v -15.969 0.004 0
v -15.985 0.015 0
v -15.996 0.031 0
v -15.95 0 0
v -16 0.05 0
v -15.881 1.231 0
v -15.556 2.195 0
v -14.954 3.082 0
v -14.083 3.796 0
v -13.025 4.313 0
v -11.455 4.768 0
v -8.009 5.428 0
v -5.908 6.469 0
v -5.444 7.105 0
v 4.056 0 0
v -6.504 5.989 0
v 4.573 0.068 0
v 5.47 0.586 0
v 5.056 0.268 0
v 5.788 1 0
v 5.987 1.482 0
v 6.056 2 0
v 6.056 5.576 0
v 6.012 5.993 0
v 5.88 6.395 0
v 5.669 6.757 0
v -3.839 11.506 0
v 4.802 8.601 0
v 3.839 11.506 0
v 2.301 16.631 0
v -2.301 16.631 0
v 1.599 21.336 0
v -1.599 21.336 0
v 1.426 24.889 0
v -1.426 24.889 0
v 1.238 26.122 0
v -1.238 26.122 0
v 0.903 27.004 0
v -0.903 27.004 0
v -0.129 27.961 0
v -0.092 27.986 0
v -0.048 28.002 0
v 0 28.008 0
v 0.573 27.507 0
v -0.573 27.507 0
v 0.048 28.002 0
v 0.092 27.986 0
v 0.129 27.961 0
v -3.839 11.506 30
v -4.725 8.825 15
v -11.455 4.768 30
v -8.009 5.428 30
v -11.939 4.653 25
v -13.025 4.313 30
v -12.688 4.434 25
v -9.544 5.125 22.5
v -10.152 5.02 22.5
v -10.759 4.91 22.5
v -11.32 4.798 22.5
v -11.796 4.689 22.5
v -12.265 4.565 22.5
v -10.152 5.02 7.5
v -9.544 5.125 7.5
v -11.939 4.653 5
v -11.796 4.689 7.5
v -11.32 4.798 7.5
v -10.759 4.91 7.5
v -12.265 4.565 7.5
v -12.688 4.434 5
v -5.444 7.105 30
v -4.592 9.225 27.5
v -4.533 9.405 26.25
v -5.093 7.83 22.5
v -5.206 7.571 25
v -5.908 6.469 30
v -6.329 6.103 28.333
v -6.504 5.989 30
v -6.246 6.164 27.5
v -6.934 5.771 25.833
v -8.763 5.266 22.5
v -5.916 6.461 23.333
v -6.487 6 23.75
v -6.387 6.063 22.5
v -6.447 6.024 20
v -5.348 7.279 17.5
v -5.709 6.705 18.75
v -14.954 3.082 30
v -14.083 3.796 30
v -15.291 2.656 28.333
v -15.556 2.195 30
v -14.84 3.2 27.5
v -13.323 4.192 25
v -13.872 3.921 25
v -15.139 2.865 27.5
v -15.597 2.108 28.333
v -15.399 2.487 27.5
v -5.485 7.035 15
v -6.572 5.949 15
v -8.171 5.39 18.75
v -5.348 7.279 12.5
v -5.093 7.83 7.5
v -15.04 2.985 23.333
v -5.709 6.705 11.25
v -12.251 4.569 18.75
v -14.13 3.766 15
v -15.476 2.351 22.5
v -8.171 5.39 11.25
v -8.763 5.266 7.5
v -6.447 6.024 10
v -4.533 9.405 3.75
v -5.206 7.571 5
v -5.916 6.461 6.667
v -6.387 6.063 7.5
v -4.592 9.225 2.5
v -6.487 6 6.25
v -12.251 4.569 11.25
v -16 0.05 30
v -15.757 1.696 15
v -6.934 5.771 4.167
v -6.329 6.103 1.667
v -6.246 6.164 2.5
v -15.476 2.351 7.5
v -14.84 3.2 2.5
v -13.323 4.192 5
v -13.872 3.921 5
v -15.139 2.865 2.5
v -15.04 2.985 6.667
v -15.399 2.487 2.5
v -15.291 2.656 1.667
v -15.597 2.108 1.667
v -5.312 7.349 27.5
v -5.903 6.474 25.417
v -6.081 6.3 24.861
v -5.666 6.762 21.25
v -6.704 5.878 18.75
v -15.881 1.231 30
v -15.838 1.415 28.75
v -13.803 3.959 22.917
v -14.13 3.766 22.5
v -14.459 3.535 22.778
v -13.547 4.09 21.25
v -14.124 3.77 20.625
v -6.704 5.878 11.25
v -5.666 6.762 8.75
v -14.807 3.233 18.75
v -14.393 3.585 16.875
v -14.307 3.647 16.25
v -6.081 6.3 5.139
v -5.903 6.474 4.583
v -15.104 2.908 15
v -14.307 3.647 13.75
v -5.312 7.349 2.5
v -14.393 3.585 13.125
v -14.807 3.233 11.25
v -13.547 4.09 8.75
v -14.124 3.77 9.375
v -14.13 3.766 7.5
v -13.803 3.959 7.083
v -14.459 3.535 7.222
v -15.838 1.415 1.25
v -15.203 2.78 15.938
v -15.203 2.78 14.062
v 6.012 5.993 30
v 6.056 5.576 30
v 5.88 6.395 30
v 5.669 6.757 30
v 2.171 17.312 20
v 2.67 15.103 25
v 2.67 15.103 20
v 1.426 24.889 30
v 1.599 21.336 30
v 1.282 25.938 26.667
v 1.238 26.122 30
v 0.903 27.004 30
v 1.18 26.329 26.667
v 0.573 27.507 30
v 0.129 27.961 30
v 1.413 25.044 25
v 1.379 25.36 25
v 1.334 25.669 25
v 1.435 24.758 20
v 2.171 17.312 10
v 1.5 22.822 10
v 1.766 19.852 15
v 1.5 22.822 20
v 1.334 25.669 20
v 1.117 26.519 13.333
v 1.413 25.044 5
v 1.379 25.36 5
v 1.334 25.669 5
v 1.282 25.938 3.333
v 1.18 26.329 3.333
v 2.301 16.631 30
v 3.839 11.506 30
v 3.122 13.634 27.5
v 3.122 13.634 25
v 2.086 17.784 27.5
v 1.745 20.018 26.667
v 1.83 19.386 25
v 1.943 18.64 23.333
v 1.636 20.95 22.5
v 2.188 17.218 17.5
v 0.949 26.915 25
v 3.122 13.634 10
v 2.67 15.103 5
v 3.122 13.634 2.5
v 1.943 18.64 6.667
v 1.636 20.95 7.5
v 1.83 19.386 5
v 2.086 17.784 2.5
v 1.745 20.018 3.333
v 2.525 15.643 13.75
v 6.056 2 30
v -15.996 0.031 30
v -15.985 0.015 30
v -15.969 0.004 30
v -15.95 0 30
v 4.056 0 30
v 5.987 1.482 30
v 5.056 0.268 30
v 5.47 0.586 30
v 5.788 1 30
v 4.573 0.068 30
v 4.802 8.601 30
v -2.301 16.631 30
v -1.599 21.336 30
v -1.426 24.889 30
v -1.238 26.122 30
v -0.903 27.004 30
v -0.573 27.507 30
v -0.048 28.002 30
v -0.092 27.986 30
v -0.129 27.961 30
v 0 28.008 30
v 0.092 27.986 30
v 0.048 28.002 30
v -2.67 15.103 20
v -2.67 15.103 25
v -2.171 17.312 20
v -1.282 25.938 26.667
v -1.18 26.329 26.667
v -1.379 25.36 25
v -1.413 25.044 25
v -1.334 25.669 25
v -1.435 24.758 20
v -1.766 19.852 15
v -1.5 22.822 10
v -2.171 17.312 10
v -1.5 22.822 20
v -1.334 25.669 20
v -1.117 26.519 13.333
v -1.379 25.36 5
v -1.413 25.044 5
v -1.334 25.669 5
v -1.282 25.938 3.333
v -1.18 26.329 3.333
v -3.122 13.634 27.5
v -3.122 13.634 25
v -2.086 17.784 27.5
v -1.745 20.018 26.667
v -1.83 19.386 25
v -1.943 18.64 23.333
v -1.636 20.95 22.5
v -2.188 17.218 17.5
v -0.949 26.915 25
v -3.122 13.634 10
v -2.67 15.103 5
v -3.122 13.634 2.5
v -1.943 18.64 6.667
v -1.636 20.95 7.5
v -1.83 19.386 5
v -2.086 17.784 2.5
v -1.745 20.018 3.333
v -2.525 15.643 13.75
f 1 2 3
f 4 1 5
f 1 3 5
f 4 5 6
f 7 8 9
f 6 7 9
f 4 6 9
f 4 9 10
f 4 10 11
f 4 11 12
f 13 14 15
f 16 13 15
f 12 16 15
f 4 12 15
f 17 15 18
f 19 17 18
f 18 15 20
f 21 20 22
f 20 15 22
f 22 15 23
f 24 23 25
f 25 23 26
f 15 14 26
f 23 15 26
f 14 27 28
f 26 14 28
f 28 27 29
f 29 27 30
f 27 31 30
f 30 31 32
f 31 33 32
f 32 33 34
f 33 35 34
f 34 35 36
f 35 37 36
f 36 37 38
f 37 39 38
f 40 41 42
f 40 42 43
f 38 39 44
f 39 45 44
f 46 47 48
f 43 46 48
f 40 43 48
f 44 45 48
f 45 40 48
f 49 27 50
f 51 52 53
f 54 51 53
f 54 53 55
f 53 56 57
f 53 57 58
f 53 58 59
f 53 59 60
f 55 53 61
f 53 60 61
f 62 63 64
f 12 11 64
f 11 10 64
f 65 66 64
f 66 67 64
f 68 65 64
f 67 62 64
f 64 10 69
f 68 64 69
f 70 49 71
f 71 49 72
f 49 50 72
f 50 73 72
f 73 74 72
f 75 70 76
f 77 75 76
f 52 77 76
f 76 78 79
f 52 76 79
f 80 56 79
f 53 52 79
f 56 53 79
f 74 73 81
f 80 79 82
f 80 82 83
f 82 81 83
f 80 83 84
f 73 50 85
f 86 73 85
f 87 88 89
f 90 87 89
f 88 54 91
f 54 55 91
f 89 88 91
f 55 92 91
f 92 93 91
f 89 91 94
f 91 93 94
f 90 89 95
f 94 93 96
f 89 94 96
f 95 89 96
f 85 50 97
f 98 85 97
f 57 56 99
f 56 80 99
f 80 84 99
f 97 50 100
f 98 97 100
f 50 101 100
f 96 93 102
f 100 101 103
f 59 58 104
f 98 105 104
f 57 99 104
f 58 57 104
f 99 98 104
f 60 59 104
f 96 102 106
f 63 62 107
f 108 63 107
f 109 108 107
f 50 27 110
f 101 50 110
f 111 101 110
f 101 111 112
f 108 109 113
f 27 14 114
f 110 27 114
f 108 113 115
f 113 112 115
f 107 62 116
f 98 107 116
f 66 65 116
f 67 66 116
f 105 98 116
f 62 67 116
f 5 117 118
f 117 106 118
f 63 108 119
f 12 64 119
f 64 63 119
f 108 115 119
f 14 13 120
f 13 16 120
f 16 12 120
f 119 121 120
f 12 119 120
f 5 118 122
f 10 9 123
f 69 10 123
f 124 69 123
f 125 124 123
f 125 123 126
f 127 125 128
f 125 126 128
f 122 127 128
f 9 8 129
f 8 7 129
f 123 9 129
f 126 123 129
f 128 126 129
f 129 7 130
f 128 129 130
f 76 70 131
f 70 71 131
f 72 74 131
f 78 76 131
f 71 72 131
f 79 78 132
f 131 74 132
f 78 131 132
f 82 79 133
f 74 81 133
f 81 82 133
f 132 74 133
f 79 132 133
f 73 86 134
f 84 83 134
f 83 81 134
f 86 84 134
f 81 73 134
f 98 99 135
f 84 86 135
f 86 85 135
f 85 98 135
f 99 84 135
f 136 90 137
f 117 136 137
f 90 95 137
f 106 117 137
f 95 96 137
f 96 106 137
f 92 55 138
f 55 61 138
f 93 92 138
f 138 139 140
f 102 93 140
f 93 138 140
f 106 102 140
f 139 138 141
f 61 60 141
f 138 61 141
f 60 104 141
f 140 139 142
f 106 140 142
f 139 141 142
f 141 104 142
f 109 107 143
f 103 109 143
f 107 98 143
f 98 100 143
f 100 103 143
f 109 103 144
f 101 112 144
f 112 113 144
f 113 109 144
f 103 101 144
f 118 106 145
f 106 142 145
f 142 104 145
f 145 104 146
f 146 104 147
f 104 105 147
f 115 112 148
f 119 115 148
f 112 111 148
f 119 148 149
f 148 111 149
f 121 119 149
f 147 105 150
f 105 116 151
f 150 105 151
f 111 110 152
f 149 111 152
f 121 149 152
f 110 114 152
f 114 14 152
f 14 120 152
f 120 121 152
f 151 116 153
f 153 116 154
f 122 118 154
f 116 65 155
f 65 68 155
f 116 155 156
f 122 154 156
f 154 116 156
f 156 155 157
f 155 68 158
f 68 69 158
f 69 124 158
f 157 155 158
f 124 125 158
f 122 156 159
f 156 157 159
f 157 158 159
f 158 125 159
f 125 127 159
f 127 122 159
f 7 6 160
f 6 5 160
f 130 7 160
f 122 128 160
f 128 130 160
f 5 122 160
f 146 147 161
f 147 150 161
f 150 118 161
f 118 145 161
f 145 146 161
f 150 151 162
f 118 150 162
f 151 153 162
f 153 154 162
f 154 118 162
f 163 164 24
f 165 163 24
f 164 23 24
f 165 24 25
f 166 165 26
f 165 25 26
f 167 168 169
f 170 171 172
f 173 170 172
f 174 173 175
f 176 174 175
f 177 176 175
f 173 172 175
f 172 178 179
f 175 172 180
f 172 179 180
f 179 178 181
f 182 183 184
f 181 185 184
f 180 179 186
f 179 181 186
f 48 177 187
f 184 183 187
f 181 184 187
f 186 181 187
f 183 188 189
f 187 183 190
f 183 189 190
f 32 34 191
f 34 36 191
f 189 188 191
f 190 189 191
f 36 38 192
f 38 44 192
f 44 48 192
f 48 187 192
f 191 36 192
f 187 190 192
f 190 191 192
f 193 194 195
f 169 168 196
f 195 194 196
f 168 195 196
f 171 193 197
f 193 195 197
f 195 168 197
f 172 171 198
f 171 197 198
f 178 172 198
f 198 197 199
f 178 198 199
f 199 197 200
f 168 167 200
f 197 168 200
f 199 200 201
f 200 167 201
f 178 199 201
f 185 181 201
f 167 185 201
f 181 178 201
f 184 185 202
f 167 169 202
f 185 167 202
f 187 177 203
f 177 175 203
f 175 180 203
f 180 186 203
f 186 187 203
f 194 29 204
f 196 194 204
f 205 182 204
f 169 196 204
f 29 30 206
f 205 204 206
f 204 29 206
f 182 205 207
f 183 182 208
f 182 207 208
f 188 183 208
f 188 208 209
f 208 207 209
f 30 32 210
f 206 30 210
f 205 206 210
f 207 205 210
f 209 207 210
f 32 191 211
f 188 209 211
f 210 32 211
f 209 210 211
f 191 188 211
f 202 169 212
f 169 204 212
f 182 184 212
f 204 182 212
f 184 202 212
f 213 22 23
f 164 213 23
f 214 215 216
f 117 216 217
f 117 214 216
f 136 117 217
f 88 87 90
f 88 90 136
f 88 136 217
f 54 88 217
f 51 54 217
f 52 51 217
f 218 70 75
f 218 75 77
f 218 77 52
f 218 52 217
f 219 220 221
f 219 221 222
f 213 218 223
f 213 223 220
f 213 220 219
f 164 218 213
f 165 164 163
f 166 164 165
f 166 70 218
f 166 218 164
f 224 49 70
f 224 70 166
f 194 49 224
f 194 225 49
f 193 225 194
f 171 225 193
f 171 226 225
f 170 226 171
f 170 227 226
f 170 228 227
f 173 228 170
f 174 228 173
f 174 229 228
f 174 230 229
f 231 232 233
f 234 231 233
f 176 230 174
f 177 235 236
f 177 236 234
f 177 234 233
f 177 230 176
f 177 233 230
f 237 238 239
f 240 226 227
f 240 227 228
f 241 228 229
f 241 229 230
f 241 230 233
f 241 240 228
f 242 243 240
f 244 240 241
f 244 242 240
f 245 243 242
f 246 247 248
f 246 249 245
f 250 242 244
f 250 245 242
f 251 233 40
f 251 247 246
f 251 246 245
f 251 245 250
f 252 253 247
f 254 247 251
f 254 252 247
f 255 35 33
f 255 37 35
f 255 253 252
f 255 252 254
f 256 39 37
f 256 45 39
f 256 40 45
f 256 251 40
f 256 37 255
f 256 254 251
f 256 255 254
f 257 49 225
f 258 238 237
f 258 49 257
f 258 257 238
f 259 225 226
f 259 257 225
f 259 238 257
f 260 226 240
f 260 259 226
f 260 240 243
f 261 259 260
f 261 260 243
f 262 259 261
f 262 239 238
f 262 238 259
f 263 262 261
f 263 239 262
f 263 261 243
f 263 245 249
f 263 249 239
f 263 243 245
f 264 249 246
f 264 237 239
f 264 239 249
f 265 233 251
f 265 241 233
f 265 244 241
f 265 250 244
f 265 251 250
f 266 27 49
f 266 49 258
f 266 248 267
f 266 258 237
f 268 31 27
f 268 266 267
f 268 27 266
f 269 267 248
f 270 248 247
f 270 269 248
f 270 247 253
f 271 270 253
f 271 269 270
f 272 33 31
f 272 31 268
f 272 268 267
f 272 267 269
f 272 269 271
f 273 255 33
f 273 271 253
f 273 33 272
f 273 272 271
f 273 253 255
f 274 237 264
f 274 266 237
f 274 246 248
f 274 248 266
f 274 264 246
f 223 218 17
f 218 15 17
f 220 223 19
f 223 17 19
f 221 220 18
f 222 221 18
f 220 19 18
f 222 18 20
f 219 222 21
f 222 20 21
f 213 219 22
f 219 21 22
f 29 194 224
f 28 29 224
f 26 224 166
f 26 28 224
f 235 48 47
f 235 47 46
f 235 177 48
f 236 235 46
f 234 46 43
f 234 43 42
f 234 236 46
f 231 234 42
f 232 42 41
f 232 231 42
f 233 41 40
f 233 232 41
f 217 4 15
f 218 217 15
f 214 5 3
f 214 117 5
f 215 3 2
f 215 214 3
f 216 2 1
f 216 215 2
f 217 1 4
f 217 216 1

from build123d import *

# Parameters (mm, degrees)
EXTRUDE_1_DEPTH     = 30
SKETCH_2_W          = 50.362012325
SKETCH_2_H          = 20.569427205
CUT_EXTRUDE_1_DEPTH = 30
FILLET_1_R          = 2
FILLET_2_R          = 0.2
FILLET_3_R          = 0.05


with BuildPart() as part:
    # 草图1 → 凸台-拉伸1 (new body)
    with BuildSketch(Plane.XY):
        with BuildLine():
            Line((-16, 0), (16, 0))
            add(Edge.make_bspline(
                [(3.839287923, 11.506222932), (4.93905782, 8.31834192), (5.60973107, 3.774130513), (16.015287623, 5.725331765), (16, 0)],
                knots=[0, 0, 0, 0, 0.346447494, 1, 1, 1, 1], degree=3))
            add(Edge.make_bspline(
                [(3.839287923, 11.506222932), (2.661546976, 14.920117068), (2.26787354, 16.507870906), (1.244234488, 22.89042522), (1.600315557, 26.835685967), (0, 28.064804979)],
                knots=[0, 0, 0, 0, 0.351320855, 0.674109807, 1, 1, 1, 1], degree=3))
            add(Edge.make_bspline(
                [(-3.839287923, 11.506222932), (-2.661546976, 14.920117068), (-2.26787354, 16.507870906), (-1.244234488, 22.89042522), (-1.600315557, 26.835685967), (0, 28.064804979)],
                knots=[0, 0, 0, 0, 0.351320855, 0.674109807, 1, 1, 1, 1], degree=3))
            add(Edge.make_bspline(
                [(-3.839287923, 11.506222932), (-4.93905782, 8.31834192), (-5.60973107, 3.774130513), (-16.015287623, 5.725331765), (-16, 0)],
                knots=[0, 0, 0, 0, 0.346447494, 1, 1, 1, 1], degree=3))
        make_face()
    extrude(amount=EXTRUDE_1_DEPTH)

    # 草图2 → 切除-拉伸1 (cut)
    with BuildSketch(Plane.XY.offset(30)):
        with Locations((31.23663348, 4.229005075)):
            Rectangle(SKETCH_2_W, SKETCH_2_H)
    extrude(amount=-CUT_EXTRUDE_1_DEPTH, mode=Mode.SUBTRACT)

    # 圆角1
    fillet_1_edges = [part.edges().sort_by_distance(p)[0] for p in [
        (6.055627317, 0, 15),
        (6.055627317, 6.323254919, 15),
    ]]
    fillet(fillet_1_edges, radius=FILLET_1_R)

    # 圆角2
    fillet_2_edges = [part.edges().sort_by_distance(p)[0] for p in [
        (0, 28.064804979, 15),
    ]]
    fillet(fillet_2_edges, radius=FILLET_2_R)

    # 圆角3
    fillet_3_edges = [part.edges().sort_by_distance(p)[0] for p in [
        (-16, 0, 15),
    ]]
    fillet(fillet_3_edges, radius=FILLET_3_R)


solid = part.part
